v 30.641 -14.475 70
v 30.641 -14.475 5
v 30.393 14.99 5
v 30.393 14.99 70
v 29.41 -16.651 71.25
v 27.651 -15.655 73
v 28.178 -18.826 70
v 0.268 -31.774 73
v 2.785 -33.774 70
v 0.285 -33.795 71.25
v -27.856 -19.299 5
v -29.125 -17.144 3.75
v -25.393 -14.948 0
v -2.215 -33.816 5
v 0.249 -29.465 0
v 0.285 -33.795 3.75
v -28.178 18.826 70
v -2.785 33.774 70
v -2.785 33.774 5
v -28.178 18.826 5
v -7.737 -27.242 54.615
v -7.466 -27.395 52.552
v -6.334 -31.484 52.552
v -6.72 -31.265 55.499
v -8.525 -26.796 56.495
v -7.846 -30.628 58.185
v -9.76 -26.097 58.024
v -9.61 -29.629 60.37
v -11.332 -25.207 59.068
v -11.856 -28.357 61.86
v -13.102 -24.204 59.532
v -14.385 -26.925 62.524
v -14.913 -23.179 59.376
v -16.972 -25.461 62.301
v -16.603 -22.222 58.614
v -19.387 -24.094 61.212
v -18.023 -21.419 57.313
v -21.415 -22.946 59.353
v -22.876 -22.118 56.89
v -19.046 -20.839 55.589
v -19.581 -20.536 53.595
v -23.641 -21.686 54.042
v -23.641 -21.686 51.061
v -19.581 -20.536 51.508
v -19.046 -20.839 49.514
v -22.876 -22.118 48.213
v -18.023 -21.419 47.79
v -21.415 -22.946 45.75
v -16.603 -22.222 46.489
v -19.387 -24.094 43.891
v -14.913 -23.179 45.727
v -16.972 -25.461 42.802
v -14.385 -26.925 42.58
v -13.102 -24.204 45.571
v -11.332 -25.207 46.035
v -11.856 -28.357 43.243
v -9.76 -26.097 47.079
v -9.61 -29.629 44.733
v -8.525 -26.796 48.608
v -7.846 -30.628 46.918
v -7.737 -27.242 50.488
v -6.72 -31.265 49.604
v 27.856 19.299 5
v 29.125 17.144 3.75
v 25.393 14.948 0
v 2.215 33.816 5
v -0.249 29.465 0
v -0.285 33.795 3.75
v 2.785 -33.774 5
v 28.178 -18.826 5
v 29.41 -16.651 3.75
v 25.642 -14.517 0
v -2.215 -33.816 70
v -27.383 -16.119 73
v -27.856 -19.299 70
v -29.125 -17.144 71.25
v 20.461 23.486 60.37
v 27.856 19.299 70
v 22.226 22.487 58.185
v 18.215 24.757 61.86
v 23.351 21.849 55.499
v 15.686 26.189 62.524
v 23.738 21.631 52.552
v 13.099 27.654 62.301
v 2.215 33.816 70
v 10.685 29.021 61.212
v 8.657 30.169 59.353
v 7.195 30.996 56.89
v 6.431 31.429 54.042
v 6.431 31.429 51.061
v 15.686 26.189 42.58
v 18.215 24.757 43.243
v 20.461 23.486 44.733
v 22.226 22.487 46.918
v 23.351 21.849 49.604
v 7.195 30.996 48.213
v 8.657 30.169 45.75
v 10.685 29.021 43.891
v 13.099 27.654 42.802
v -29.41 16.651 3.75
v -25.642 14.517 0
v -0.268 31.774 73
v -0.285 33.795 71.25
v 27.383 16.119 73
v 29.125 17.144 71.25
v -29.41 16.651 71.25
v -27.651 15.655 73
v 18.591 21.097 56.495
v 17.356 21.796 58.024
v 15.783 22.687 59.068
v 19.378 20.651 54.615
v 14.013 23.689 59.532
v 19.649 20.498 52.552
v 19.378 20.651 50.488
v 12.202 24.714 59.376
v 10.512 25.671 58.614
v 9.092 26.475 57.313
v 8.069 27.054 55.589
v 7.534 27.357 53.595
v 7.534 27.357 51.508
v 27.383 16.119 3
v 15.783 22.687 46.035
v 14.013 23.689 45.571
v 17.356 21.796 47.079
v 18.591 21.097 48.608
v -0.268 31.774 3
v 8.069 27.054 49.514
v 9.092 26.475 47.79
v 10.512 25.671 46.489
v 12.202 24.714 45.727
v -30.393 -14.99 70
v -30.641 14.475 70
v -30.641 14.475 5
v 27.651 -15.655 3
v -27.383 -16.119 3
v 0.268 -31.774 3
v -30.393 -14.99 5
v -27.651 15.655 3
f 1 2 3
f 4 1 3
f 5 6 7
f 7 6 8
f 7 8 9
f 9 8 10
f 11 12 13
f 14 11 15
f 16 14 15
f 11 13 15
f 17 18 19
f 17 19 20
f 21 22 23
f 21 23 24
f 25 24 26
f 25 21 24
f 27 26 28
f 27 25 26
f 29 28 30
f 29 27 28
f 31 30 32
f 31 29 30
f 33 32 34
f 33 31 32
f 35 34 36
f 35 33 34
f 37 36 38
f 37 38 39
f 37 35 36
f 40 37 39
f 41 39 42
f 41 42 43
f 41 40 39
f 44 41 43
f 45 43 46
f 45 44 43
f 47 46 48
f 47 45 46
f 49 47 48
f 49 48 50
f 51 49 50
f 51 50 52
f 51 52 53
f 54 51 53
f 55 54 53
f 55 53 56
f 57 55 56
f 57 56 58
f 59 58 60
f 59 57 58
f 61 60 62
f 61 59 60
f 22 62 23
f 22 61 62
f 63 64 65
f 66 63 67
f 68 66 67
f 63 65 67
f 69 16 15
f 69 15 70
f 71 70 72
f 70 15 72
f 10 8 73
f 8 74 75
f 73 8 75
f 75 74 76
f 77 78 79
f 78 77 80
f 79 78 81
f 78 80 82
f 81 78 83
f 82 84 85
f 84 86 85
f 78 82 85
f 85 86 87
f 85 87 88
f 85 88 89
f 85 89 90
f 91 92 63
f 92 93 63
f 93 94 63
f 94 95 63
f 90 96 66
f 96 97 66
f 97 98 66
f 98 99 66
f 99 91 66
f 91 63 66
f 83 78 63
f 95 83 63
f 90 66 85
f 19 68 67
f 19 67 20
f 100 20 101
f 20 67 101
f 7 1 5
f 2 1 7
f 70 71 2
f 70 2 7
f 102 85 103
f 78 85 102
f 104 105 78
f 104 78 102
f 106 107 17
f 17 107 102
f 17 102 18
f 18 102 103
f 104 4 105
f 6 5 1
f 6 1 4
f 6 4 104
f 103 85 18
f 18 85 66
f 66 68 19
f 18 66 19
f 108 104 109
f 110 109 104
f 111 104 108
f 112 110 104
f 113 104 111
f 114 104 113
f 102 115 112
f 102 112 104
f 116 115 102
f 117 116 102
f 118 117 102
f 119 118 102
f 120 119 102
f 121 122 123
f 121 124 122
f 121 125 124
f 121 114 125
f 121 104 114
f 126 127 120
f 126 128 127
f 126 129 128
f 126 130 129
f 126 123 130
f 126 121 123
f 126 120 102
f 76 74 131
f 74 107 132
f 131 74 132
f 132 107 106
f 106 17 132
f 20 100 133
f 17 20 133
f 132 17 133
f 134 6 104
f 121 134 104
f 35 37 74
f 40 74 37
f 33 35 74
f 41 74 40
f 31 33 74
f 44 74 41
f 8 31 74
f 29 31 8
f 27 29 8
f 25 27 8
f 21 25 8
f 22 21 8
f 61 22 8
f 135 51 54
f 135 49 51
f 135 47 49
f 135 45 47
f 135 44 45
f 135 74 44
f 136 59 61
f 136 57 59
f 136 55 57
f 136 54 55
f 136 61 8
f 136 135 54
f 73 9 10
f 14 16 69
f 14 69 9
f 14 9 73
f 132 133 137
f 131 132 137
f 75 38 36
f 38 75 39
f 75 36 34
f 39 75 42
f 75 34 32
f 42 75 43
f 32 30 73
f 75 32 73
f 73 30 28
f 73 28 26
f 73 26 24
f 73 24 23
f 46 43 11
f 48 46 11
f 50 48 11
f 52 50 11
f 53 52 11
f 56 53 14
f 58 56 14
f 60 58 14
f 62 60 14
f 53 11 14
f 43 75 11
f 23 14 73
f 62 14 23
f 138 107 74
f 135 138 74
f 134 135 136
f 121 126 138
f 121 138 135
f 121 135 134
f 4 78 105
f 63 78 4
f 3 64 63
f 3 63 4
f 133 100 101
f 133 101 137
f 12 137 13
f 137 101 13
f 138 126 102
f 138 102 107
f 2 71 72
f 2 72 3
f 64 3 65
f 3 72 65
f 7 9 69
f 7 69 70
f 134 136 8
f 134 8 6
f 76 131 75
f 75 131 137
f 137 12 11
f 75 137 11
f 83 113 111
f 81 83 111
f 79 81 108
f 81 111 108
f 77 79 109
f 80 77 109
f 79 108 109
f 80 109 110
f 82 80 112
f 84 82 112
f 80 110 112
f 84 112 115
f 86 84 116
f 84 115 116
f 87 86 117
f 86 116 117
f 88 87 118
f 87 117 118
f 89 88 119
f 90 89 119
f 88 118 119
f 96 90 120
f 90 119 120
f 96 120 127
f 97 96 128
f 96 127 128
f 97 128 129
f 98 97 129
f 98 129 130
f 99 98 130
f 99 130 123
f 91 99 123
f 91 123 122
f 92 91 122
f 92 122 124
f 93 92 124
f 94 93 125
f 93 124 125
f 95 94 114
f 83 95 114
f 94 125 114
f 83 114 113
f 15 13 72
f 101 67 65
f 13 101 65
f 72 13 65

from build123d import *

# Parameters (mm, degrees)
F1_DEPTH     = 75
F2_T         = -3
F3_SIZE      = 5
F4_T1_DEPTH  = 60.9562282093
F4_T3_DEPTH  = 60.9562282093
F4_T5_DEPTH  = 60.9562282093
F4_T7_DEPTH  = 60.9562282093
F4_T9_DEPTH  = 60.9562282093
F4_T11_DEPTH = 60.9562282093
F6_D         = 10
F7_T1_DEPTH  = 80.3079500043


# Not quite as in the source:
# - a fillet or chamfer that OpenCascade refuses, or shapes differently, is made with other operations: its cross-section is extruded or revolved along the edge and cut away or added


with BuildPart() as f1:
    # F0 (on Top) → F1 (new body)
    with BuildSketch(Plane.XY):
        Polygon((-0.2972451442, 35.2381446725), (-30.6657510407, 17.3616504902), (-30.3685058965, -17.8764941822), (0.2972451442, -35.2381446725), (30.6657510407, -17.3616504902), (30.3685058965, 17.8764941822), align=None)
    extrude(amount=F1_DEPTH)

    # F2
    f2_openings = [f1.faces().sort_by_distance(p)[0] for p in [
        (0, 0, 75),
    ]]
    offset(amount=F2_T, openings=f2_openings)

    # F3
    f3_edges = [f1.edges().sort_by_distance(p)[0] for p in [
        (15.03563, 26.557319, 0),
        (-15.481498, 26.299898, 0),
        (-30.517128, -0.257422, 0),
        (-15.03563, -26.557319, 0),
        (15.481498, -26.299898, 0),
        (30.517128, 0.257422, 0),
    ]]
    chamfer(f3_edges, length=F3_SIZE)

    # F4: chamfer of 5 on 6 edges, made by hand

    # F4_s2 → F4_t1 (cut)
    with BuildSketch(Plane(origin=(-26.5224238672, 15.0158739867, 0), x_dir=(0, 0, 1), z_dir=(0.8702121062, -0.4926772679, 0))):
        Polygon((75, 25.5182141675), (70, 30.5182141675), (75, 30.5182141675), align=None)
    extrude(amount=F4_T1_DEPTH, mode=Mode.SUBTRACT)

    # F4_s4 → F4_t3 (cut)
    with BuildSketch(Plane(origin=(-0.257083601, 30.4770298323, 0), x_dir=(0, 0, 1), z_dir=(0.0084350232, -0.9999644246, 0))):
        Polygon((75, 25.5182141675), (70, 30.5182141675), (75, 30.5182141675), align=None)
    extrude(amount=F4_T3_DEPTH, mode=Mode.SUBTRACT)

    # F4_s6 → F4_t5 (cut)
    with BuildSketch(Plane(origin=(26.2653402661, 15.4611558455, 0), x_dir=(0, 0, 1), z_dir=(-0.8617770829, -0.5072871567, 0))):
        Polygon((75, 25.5182141675), (70, 30.5182141675), (75, 30.5182141675), align=None)
    extrude(amount=F4_T5_DEPTH, mode=Mode.SUBTRACT)

    # F4_s8 → F4_t7 (cut)
    with BuildSketch(Plane(origin=(26.5224238672, -15.0158739867, 0), x_dir=(0, 0, 1), z_dir=(-0.8702121062, 0.4926772679, 0))):
        Polygon((70, 30.5182141675), (75, 25.5182141675), (75, 30.5182141675), align=None)
    extrude(amount=F4_T7_DEPTH, mode=Mode.SUBTRACT)

    # F4_s10 → F4_t9 (cut)
    with BuildSketch(Plane(origin=(0.257083601, -30.4770298323, 0), x_dir=(0, 0, 1), z_dir=(-0.0084350232, 0.9999644246, 0))):
        Polygon((70, 30.5182141675), (75, 25.5182141675), (75, 30.5182141675), align=None)
    extrude(amount=F4_T9_DEPTH, mode=Mode.SUBTRACT)

    # F4_s12 → F4_t11 (cut)
    with BuildSketch(Plane(origin=(-26.2653402661, -15.4611558455, 0), x_dir=(0, 0, 1), z_dir=(0.8617770829, 0.5072871567, 0))):
        Polygon((75, 25.5182141675), (70, 30.5182141675), (75, 30.5182141675), align=None)
    extrude(amount=F4_T11_DEPTH, mode=Mode.SUBTRACT)

    # F6 (through all)
    with Locations(Plane(origin=(-15.0356303762, -26.5573194273, 0), x_dir=(0.8702121062, -0.4926772679, 0), z_dir=(-0.4926772679, -0.8702121062, 0))):
        with Locations((0, 52.5516085327)):
            Hole(F6_D / 2)

    # F7: chamfer of 5 on 8 edges, made by hand

    # F7_s2 → F7_t1 (cut)
    with BuildSketch(Plane.XY.offset(-2.6539750021)):
        Polygon((-30.3928557112, -14.9898455337), (-27.8564199277, -19.2987309484), (-30.3685058965, -17.8764941822), align=None)
        Polygon((-28.1780148866, 18.8260623726), (-30.6414012259, 14.4750018417), (-30.6657510407, 17.3616504902), align=None)
        Polygon((2.2148408246, 33.8159079063), (-2.7849812982, 33.7737327901), (-0.2972451442, 35.2381446725), align=None)
        Polygon((27.8564199277, 19.2987309484), (30.3928557112, 14.9898455337), (30.3685058965, 17.8764941822), align=None)
        Polygon((30.6414012259, -14.4750018417), (28.1780148866, -18.8260623726), (30.6657510407, -17.3616504902), align=None)
        Polygon((2.7849812982, -33.7737327901), (-2.2148408246, -33.8159079063), (0.2972451442, -35.2381446725), align=None)
    extrude(amount=F7_T1_DEPTH, mode=Mode.SUBTRACT)

    # F7_s3 → F7_t4 (revolve, cut)
    with BuildSketch(Plane.XY.offset(52.5516085327)):
        Polygon((23.7377514379, 21.6305467487), (16.9233045677, 19.7428725572), (19.386690907, 24.093933088), align=None)
    revolve(axis=Axis((15.0356303762, 26.5573194273, 52.5516085327), (-0.4926772679, -0.8702121062, 0)), mode=Mode.SUBTRACT)

    # F7_s5 → F7_t6 (revolve, cut)
    with BuildSketch(Plane.XY.offset(52.5516085327)):
        Polygon((-6.3335093144, -31.484092106), (-8.221183506, -24.6696452358), (-10.6845698453, -29.0207057667), align=None)
    revolve(axis=Axis((-15.0356303762, -26.5573194273, 52.5516085327), (-0.4926772679, -0.8702121062, 0)), mode=Mode.SUBTRACT)


solid = f1.part
